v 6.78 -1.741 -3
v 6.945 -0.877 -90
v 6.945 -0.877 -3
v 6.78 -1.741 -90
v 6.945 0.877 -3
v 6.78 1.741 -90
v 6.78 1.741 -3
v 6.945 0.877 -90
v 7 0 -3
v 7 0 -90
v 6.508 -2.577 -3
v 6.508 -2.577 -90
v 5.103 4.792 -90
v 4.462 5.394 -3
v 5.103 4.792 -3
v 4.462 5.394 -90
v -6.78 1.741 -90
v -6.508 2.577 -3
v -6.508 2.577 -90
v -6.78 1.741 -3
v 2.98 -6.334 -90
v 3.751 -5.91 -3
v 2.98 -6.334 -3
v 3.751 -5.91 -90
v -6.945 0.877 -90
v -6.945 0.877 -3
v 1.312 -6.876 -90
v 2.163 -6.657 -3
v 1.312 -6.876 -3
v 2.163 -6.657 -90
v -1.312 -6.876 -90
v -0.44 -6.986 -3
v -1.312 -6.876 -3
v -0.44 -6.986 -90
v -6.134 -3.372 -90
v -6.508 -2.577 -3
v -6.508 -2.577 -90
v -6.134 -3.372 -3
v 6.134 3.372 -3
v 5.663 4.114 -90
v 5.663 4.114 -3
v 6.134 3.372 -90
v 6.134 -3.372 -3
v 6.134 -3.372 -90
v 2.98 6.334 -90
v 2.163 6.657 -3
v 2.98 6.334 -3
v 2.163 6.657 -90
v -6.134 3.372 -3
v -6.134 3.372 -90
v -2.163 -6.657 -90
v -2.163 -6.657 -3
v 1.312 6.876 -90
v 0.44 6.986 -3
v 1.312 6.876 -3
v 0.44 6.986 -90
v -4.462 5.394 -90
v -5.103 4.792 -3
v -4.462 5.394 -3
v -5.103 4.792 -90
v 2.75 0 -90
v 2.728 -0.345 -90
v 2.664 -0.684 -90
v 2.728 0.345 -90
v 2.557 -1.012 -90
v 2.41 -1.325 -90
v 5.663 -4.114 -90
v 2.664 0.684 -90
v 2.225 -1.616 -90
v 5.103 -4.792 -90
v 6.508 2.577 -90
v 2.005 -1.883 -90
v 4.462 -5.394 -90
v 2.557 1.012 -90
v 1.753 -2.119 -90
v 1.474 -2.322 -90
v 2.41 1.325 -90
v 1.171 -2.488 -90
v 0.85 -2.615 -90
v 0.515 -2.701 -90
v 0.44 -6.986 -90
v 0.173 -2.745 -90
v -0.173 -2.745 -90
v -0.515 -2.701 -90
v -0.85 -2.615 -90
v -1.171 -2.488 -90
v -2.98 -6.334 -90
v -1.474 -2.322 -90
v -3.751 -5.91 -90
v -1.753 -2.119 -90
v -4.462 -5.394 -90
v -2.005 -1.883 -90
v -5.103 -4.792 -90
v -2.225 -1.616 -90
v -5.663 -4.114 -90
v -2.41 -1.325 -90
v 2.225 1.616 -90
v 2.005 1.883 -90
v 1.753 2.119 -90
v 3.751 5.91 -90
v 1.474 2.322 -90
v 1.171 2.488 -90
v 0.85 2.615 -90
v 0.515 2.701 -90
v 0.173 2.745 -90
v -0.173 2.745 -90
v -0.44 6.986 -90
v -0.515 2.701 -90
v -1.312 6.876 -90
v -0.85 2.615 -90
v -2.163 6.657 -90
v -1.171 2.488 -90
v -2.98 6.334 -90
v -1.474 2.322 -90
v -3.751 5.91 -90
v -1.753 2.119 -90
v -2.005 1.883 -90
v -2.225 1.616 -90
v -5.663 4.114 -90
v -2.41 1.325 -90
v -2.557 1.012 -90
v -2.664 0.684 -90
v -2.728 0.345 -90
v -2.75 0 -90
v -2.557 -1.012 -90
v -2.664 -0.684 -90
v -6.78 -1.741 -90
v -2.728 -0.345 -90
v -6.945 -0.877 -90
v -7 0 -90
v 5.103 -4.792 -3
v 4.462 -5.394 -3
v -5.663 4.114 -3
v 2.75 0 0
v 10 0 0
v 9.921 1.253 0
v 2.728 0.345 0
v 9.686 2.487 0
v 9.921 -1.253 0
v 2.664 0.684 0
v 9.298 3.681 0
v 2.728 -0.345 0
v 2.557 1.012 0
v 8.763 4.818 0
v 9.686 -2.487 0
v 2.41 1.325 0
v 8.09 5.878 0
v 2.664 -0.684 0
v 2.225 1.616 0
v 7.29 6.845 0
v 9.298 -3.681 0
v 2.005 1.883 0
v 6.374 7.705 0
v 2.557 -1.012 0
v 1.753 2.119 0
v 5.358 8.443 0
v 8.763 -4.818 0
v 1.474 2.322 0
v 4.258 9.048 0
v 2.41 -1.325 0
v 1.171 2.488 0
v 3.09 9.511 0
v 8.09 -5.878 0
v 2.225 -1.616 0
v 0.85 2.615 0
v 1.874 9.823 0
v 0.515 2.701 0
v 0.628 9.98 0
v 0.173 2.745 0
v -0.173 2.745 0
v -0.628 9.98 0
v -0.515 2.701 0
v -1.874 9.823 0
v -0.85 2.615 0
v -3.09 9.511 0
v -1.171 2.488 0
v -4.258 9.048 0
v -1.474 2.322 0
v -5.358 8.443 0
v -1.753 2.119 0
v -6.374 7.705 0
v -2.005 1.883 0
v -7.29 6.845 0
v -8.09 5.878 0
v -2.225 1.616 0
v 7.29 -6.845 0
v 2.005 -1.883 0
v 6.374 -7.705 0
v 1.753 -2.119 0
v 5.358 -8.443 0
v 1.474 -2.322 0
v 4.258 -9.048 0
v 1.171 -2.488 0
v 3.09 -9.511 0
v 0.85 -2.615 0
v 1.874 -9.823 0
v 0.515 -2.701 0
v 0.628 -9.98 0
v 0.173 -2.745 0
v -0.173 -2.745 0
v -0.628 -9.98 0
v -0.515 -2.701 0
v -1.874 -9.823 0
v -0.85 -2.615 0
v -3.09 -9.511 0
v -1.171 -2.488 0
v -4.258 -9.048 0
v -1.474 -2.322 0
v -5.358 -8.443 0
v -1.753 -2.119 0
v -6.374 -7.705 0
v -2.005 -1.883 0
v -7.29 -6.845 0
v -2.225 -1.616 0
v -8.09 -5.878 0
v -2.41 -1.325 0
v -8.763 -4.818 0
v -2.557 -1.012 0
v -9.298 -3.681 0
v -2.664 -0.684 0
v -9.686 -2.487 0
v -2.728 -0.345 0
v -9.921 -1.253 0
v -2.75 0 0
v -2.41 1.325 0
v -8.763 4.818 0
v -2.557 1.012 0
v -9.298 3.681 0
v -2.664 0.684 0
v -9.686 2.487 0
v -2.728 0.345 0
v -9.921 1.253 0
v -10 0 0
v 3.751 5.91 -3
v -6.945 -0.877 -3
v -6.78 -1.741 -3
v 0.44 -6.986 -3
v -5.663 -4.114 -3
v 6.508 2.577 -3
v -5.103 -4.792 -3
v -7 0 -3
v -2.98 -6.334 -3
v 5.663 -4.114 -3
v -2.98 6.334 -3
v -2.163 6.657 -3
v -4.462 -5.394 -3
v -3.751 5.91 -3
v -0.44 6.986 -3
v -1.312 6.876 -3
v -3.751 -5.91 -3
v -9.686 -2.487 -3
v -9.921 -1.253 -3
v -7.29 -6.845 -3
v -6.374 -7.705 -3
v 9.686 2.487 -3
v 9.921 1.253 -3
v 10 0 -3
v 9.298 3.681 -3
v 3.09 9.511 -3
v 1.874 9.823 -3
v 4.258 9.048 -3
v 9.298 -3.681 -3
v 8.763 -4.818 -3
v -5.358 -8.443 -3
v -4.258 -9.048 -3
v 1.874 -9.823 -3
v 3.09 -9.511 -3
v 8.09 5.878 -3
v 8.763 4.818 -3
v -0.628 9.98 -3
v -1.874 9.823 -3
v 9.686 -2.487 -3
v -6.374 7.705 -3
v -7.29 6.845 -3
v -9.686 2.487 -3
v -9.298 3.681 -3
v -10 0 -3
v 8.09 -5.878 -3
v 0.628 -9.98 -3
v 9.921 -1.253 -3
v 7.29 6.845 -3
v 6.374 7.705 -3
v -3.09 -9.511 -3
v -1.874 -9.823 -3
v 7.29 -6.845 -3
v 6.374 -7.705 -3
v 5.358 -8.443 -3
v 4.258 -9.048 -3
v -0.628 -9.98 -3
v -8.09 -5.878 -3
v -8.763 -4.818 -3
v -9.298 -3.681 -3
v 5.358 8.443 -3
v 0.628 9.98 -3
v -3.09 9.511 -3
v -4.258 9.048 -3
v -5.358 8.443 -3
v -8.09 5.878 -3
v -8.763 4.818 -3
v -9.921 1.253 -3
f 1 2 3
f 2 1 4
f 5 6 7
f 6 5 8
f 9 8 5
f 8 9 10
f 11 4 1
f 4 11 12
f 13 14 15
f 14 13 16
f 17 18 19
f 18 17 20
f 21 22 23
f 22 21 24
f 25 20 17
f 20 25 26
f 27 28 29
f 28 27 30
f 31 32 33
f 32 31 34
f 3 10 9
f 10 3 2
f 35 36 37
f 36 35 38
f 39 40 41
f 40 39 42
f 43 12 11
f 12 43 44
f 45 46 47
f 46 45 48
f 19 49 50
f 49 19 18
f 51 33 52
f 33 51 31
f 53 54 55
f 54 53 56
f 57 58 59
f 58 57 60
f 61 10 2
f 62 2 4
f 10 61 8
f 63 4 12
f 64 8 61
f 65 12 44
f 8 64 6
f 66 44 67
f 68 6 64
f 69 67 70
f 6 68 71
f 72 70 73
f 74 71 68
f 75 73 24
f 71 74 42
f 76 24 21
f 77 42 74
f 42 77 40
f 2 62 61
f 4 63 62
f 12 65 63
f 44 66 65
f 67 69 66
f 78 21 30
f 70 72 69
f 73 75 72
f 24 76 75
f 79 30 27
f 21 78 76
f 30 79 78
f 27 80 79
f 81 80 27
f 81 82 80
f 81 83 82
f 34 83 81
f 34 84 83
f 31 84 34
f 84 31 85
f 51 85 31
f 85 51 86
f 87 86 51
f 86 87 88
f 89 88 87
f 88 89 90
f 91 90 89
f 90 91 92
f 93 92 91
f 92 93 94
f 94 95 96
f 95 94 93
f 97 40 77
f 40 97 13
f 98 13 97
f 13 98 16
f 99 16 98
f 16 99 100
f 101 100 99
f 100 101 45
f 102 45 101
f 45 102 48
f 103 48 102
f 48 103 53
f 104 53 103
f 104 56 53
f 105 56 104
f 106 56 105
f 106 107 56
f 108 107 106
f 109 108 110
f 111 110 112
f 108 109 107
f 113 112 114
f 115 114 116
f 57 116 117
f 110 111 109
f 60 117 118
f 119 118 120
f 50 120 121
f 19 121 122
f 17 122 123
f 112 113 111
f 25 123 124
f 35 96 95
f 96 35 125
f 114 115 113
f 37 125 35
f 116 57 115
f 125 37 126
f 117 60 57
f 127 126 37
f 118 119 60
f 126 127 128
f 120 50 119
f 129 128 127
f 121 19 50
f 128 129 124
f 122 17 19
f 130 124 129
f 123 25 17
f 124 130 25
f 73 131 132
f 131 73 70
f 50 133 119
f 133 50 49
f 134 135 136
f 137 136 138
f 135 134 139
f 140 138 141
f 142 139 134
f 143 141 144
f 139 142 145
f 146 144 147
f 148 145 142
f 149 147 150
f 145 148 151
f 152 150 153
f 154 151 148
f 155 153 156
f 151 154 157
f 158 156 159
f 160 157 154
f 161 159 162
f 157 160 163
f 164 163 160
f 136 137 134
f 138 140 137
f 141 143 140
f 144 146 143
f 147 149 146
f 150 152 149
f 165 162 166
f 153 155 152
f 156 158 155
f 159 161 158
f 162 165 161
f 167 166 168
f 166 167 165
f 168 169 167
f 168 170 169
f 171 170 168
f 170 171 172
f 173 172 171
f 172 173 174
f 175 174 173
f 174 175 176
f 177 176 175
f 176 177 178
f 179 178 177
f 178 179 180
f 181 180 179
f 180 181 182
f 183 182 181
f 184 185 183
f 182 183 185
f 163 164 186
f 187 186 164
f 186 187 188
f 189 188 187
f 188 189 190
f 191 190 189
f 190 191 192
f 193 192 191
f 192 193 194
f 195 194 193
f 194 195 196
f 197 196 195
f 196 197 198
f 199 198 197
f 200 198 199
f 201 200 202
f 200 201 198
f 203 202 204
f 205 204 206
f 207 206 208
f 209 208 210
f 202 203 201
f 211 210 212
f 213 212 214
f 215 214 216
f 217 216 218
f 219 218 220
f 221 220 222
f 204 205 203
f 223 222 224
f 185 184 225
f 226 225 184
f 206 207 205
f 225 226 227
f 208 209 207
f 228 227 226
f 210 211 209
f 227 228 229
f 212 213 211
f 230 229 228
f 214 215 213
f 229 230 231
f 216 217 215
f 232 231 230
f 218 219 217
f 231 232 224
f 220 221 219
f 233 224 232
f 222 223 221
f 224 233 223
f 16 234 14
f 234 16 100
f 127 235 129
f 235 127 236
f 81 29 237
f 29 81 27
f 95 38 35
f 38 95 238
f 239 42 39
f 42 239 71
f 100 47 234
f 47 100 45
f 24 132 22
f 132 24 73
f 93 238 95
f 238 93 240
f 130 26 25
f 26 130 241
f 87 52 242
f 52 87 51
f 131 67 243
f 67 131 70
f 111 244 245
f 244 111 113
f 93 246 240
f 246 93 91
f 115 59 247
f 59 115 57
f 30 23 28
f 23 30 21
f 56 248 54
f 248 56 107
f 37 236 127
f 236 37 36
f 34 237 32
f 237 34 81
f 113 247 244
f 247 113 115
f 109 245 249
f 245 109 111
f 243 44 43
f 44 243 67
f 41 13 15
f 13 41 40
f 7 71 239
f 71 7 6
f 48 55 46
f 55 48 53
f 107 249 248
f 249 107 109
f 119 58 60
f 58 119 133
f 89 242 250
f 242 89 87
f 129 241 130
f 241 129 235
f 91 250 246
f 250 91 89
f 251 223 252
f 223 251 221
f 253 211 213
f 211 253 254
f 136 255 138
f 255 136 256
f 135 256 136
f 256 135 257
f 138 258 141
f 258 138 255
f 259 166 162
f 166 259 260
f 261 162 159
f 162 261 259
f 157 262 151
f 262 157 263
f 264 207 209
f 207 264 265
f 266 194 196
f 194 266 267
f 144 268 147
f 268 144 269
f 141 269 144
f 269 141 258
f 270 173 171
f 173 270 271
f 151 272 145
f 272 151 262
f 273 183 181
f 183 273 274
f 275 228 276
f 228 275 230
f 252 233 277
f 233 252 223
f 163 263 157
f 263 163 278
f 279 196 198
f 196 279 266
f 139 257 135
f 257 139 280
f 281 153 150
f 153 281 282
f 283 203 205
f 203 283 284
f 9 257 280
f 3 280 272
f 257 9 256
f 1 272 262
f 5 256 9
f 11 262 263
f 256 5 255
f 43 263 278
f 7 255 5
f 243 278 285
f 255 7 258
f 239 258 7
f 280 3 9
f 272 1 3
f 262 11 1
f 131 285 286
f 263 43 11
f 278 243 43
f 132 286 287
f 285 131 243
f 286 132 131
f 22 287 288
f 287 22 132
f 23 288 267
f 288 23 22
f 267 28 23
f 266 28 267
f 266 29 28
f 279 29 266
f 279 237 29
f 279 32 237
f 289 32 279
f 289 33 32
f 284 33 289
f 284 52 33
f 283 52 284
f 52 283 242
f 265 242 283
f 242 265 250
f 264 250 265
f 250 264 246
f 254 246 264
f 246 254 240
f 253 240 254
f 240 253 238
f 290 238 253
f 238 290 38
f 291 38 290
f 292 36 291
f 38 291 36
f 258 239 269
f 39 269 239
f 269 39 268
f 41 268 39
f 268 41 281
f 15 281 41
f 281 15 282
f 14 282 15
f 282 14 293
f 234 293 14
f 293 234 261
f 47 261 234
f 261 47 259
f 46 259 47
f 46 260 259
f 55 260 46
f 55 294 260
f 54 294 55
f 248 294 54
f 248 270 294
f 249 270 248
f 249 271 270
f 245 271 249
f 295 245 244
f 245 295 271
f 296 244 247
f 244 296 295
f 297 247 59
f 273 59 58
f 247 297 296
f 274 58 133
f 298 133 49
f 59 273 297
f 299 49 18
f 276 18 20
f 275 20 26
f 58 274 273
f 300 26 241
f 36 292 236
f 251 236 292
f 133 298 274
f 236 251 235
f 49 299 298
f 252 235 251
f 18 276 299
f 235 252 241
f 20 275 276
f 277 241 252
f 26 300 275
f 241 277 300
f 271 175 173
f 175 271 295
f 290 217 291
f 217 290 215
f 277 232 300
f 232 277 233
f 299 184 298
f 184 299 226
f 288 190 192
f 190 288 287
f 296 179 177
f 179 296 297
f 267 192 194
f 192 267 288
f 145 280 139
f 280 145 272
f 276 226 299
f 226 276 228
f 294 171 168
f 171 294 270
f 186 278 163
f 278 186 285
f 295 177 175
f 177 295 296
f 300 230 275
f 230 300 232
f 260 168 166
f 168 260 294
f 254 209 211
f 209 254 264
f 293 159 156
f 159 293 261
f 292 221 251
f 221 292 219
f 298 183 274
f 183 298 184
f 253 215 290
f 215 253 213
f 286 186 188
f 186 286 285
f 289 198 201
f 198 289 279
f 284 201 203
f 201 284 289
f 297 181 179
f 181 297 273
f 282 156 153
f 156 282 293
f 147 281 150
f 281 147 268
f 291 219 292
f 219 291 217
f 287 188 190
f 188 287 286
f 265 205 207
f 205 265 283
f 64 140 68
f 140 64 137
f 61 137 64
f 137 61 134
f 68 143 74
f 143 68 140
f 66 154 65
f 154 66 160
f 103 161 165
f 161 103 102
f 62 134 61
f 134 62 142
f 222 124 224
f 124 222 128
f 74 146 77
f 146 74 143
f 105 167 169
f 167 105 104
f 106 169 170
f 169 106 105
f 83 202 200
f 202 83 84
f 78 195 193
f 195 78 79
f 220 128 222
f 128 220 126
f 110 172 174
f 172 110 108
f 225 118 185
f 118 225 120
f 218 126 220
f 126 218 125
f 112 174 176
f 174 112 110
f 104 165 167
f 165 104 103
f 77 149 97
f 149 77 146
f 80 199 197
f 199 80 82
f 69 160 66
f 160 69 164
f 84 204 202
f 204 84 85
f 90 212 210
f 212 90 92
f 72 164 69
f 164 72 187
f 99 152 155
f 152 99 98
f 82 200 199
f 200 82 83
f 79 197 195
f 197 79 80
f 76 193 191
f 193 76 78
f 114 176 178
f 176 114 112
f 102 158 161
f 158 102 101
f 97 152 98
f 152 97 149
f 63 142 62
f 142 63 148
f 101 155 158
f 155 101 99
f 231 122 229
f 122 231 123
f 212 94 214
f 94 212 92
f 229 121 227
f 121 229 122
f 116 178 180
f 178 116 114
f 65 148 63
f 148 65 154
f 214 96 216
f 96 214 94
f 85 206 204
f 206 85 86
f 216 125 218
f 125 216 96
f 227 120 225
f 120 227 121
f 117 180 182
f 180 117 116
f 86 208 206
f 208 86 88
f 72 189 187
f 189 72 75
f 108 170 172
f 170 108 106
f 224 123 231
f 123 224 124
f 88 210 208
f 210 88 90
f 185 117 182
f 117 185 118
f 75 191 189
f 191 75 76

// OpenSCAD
$fn = 50;


difference() {
	union() {
		translate(v = [0, 0, -90.0000000000]) {
			cylinder(h = 90, r = 7.0000000000);
		}
		translate(v = [0, 0, -3.0000000000]) {
			cylinder(h = 3, r = 10.0000000000);
		}
	}
	union() {
		#translate(v = [0, 0, -90]) {
			cylinder(h = 90, r = 2.7500000000);
		}
	}
}
